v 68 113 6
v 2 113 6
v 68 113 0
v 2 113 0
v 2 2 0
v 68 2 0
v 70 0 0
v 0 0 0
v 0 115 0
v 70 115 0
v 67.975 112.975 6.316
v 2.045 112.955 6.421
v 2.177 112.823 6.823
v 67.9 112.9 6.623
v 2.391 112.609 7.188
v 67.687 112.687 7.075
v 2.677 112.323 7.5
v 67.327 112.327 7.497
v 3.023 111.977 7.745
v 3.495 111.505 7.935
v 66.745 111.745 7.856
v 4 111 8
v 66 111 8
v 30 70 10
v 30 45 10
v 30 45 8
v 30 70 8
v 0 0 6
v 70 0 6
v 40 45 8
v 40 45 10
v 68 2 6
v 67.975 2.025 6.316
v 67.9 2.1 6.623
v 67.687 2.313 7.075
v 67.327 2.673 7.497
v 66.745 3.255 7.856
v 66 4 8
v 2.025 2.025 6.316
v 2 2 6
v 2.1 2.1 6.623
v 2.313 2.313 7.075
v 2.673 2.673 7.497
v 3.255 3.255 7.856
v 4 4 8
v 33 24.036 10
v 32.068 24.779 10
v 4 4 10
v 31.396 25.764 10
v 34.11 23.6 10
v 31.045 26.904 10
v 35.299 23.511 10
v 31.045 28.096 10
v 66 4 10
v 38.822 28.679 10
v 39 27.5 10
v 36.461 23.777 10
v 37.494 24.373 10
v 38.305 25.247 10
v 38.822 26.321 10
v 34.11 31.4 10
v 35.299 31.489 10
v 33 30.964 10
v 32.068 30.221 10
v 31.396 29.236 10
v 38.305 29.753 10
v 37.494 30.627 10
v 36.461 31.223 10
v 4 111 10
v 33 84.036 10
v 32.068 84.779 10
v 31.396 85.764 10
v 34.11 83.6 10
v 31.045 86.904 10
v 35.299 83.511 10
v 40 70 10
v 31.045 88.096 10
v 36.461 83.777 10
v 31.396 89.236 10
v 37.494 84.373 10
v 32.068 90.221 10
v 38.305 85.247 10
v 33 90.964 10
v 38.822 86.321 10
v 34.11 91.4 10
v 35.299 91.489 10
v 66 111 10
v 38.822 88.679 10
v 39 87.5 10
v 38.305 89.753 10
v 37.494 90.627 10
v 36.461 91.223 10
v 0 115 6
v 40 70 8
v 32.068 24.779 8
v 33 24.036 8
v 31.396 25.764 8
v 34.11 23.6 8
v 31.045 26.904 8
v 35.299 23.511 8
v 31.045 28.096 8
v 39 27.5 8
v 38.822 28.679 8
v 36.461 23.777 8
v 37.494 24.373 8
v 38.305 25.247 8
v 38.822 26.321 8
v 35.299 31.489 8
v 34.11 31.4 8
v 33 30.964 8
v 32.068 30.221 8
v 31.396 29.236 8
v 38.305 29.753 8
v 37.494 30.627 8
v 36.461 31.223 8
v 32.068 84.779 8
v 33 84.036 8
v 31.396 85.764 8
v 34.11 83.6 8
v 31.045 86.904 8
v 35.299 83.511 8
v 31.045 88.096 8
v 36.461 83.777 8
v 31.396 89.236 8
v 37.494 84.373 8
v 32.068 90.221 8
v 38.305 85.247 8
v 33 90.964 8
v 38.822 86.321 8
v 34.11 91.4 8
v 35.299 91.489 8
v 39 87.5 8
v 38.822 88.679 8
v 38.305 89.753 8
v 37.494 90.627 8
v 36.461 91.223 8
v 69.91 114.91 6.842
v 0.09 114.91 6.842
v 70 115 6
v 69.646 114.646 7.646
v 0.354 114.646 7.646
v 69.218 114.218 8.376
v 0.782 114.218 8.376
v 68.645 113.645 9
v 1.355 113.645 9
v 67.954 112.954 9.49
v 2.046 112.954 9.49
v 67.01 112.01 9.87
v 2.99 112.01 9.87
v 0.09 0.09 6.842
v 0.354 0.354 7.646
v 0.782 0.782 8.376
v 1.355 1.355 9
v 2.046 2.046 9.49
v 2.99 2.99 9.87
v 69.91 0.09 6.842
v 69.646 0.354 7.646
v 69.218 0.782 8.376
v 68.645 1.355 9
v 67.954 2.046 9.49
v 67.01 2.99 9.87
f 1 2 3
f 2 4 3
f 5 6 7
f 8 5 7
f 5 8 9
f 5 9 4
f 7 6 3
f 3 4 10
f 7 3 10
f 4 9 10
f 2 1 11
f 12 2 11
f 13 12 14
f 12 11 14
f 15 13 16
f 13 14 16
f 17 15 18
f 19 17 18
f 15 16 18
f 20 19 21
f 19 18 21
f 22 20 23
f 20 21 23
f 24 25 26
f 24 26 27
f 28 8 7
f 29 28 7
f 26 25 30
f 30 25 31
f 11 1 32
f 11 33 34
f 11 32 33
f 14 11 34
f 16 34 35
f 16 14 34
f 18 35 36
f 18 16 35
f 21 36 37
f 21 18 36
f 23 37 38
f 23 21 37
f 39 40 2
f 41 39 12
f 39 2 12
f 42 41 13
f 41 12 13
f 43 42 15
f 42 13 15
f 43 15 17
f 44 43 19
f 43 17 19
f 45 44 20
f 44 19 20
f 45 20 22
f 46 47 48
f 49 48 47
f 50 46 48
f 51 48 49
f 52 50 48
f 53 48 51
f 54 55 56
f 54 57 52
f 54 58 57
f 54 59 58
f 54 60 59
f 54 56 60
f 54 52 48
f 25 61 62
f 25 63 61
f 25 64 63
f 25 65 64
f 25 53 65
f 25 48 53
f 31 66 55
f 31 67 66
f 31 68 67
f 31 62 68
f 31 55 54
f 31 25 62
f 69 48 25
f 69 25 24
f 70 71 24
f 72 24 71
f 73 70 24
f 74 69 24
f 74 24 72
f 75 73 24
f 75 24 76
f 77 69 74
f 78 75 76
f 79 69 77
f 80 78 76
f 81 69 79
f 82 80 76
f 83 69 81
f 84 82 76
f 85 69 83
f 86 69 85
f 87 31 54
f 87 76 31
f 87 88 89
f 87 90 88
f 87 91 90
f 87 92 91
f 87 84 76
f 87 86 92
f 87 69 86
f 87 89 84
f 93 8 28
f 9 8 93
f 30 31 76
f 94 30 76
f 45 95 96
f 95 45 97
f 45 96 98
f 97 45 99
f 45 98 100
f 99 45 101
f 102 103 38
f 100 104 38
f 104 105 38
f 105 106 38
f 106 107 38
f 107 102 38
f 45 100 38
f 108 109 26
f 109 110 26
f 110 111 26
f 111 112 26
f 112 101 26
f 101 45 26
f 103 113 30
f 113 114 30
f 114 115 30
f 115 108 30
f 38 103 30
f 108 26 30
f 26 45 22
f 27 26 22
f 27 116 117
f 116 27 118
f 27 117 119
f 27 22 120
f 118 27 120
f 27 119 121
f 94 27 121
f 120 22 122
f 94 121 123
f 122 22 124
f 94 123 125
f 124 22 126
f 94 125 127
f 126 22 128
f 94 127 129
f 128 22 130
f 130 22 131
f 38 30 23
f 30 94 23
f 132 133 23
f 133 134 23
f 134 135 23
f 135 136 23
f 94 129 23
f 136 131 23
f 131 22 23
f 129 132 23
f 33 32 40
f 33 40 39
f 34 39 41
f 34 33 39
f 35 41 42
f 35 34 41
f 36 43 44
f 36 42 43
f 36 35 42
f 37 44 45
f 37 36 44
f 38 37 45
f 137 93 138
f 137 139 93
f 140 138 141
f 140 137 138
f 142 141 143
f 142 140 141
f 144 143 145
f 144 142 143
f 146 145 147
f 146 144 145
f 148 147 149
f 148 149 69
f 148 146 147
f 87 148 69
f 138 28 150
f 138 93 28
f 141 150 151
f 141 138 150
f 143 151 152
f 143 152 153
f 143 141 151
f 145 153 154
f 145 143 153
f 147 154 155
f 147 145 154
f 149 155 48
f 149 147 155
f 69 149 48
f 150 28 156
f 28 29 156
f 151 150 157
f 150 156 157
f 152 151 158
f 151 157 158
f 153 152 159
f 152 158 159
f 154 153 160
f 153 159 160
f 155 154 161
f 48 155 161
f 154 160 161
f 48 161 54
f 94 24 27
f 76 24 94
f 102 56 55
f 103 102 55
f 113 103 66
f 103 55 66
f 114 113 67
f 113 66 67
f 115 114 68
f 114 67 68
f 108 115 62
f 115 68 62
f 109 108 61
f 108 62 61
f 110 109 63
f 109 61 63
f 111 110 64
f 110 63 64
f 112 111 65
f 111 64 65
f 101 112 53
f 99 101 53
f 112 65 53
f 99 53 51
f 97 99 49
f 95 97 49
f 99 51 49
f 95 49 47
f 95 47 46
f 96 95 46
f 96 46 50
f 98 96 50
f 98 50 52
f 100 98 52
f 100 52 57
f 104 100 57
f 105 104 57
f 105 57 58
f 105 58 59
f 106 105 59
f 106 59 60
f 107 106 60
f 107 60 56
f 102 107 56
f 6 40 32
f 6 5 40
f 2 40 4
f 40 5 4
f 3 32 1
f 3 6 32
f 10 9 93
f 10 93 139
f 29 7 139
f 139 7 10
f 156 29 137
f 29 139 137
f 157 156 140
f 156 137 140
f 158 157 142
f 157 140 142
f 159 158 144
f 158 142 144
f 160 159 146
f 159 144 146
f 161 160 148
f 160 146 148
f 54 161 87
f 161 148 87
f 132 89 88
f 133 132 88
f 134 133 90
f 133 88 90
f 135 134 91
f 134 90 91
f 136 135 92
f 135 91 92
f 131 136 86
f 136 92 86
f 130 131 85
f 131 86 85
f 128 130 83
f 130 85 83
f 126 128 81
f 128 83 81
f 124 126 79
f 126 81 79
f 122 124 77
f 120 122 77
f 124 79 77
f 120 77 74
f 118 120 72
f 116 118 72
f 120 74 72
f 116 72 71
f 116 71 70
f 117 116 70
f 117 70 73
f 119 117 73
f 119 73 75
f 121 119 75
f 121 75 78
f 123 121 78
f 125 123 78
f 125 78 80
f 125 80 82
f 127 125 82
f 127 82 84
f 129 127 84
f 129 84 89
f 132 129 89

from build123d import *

# Parameters (mm, degrees)
CROQUIS2_W              = 70
CROQUIS2_H              = 115
SALIENTE_EXTRUIR1_DEPTH = 10
REDONDEO1_R             = 4
VACIADO1_T              = -2
CROQUIS3_R              = 4
CROQUIS3_W              = 10
CROQUIS3_H              = 25
CORTAR_EXTRUIR1_DEPTH   = 10


with BuildPart() as part:
    # Croquis2 → Saliente-Extruir1 (new body)
    with BuildSketch(Plane.XY):
        with Locations((35, 57.5)):
            Rectangle(CROQUIS2_W, CROQUIS2_H)
    extrude(amount=SALIENTE_EXTRUIR1_DEPTH)

    # Redondeo1
    redondeo1_edges = [part.edges().sort_by_distance(p)[0] for p in [
        (70, 57.5, 10),
        (35, 115, 10),
        (0, 57.5, 10),
        (35, 0, 10),
    ]]
    fillet(redondeo1_edges, radius=REDONDEO1_R)

    # Vaciado1
    vaciado1_openings = [part.faces().sort_by_distance(p)[0] for p in [
        (35, 57.5, 0),
    ]]
    offset(amount=VACIADO1_T, openings=vaciado1_openings)

    # Croquis3 → Cortar-Extruir1 (cut)
    with BuildSketch(Plane.XY.offset(10)):
        with Locations((35, 87.5)):
            Circle(CROQUIS3_R)
        with Locations((35, 27.5)):
            Circle(CROQUIS3_R)
        with Locations((35, 57.5)):
            Rectangle(CROQUIS3_W, CROQUIS3_H)
    extrude(amount=-CORTAR_EXTRUIR1_DEPTH, mode=Mode.SUBTRACT)


solid = part.part
